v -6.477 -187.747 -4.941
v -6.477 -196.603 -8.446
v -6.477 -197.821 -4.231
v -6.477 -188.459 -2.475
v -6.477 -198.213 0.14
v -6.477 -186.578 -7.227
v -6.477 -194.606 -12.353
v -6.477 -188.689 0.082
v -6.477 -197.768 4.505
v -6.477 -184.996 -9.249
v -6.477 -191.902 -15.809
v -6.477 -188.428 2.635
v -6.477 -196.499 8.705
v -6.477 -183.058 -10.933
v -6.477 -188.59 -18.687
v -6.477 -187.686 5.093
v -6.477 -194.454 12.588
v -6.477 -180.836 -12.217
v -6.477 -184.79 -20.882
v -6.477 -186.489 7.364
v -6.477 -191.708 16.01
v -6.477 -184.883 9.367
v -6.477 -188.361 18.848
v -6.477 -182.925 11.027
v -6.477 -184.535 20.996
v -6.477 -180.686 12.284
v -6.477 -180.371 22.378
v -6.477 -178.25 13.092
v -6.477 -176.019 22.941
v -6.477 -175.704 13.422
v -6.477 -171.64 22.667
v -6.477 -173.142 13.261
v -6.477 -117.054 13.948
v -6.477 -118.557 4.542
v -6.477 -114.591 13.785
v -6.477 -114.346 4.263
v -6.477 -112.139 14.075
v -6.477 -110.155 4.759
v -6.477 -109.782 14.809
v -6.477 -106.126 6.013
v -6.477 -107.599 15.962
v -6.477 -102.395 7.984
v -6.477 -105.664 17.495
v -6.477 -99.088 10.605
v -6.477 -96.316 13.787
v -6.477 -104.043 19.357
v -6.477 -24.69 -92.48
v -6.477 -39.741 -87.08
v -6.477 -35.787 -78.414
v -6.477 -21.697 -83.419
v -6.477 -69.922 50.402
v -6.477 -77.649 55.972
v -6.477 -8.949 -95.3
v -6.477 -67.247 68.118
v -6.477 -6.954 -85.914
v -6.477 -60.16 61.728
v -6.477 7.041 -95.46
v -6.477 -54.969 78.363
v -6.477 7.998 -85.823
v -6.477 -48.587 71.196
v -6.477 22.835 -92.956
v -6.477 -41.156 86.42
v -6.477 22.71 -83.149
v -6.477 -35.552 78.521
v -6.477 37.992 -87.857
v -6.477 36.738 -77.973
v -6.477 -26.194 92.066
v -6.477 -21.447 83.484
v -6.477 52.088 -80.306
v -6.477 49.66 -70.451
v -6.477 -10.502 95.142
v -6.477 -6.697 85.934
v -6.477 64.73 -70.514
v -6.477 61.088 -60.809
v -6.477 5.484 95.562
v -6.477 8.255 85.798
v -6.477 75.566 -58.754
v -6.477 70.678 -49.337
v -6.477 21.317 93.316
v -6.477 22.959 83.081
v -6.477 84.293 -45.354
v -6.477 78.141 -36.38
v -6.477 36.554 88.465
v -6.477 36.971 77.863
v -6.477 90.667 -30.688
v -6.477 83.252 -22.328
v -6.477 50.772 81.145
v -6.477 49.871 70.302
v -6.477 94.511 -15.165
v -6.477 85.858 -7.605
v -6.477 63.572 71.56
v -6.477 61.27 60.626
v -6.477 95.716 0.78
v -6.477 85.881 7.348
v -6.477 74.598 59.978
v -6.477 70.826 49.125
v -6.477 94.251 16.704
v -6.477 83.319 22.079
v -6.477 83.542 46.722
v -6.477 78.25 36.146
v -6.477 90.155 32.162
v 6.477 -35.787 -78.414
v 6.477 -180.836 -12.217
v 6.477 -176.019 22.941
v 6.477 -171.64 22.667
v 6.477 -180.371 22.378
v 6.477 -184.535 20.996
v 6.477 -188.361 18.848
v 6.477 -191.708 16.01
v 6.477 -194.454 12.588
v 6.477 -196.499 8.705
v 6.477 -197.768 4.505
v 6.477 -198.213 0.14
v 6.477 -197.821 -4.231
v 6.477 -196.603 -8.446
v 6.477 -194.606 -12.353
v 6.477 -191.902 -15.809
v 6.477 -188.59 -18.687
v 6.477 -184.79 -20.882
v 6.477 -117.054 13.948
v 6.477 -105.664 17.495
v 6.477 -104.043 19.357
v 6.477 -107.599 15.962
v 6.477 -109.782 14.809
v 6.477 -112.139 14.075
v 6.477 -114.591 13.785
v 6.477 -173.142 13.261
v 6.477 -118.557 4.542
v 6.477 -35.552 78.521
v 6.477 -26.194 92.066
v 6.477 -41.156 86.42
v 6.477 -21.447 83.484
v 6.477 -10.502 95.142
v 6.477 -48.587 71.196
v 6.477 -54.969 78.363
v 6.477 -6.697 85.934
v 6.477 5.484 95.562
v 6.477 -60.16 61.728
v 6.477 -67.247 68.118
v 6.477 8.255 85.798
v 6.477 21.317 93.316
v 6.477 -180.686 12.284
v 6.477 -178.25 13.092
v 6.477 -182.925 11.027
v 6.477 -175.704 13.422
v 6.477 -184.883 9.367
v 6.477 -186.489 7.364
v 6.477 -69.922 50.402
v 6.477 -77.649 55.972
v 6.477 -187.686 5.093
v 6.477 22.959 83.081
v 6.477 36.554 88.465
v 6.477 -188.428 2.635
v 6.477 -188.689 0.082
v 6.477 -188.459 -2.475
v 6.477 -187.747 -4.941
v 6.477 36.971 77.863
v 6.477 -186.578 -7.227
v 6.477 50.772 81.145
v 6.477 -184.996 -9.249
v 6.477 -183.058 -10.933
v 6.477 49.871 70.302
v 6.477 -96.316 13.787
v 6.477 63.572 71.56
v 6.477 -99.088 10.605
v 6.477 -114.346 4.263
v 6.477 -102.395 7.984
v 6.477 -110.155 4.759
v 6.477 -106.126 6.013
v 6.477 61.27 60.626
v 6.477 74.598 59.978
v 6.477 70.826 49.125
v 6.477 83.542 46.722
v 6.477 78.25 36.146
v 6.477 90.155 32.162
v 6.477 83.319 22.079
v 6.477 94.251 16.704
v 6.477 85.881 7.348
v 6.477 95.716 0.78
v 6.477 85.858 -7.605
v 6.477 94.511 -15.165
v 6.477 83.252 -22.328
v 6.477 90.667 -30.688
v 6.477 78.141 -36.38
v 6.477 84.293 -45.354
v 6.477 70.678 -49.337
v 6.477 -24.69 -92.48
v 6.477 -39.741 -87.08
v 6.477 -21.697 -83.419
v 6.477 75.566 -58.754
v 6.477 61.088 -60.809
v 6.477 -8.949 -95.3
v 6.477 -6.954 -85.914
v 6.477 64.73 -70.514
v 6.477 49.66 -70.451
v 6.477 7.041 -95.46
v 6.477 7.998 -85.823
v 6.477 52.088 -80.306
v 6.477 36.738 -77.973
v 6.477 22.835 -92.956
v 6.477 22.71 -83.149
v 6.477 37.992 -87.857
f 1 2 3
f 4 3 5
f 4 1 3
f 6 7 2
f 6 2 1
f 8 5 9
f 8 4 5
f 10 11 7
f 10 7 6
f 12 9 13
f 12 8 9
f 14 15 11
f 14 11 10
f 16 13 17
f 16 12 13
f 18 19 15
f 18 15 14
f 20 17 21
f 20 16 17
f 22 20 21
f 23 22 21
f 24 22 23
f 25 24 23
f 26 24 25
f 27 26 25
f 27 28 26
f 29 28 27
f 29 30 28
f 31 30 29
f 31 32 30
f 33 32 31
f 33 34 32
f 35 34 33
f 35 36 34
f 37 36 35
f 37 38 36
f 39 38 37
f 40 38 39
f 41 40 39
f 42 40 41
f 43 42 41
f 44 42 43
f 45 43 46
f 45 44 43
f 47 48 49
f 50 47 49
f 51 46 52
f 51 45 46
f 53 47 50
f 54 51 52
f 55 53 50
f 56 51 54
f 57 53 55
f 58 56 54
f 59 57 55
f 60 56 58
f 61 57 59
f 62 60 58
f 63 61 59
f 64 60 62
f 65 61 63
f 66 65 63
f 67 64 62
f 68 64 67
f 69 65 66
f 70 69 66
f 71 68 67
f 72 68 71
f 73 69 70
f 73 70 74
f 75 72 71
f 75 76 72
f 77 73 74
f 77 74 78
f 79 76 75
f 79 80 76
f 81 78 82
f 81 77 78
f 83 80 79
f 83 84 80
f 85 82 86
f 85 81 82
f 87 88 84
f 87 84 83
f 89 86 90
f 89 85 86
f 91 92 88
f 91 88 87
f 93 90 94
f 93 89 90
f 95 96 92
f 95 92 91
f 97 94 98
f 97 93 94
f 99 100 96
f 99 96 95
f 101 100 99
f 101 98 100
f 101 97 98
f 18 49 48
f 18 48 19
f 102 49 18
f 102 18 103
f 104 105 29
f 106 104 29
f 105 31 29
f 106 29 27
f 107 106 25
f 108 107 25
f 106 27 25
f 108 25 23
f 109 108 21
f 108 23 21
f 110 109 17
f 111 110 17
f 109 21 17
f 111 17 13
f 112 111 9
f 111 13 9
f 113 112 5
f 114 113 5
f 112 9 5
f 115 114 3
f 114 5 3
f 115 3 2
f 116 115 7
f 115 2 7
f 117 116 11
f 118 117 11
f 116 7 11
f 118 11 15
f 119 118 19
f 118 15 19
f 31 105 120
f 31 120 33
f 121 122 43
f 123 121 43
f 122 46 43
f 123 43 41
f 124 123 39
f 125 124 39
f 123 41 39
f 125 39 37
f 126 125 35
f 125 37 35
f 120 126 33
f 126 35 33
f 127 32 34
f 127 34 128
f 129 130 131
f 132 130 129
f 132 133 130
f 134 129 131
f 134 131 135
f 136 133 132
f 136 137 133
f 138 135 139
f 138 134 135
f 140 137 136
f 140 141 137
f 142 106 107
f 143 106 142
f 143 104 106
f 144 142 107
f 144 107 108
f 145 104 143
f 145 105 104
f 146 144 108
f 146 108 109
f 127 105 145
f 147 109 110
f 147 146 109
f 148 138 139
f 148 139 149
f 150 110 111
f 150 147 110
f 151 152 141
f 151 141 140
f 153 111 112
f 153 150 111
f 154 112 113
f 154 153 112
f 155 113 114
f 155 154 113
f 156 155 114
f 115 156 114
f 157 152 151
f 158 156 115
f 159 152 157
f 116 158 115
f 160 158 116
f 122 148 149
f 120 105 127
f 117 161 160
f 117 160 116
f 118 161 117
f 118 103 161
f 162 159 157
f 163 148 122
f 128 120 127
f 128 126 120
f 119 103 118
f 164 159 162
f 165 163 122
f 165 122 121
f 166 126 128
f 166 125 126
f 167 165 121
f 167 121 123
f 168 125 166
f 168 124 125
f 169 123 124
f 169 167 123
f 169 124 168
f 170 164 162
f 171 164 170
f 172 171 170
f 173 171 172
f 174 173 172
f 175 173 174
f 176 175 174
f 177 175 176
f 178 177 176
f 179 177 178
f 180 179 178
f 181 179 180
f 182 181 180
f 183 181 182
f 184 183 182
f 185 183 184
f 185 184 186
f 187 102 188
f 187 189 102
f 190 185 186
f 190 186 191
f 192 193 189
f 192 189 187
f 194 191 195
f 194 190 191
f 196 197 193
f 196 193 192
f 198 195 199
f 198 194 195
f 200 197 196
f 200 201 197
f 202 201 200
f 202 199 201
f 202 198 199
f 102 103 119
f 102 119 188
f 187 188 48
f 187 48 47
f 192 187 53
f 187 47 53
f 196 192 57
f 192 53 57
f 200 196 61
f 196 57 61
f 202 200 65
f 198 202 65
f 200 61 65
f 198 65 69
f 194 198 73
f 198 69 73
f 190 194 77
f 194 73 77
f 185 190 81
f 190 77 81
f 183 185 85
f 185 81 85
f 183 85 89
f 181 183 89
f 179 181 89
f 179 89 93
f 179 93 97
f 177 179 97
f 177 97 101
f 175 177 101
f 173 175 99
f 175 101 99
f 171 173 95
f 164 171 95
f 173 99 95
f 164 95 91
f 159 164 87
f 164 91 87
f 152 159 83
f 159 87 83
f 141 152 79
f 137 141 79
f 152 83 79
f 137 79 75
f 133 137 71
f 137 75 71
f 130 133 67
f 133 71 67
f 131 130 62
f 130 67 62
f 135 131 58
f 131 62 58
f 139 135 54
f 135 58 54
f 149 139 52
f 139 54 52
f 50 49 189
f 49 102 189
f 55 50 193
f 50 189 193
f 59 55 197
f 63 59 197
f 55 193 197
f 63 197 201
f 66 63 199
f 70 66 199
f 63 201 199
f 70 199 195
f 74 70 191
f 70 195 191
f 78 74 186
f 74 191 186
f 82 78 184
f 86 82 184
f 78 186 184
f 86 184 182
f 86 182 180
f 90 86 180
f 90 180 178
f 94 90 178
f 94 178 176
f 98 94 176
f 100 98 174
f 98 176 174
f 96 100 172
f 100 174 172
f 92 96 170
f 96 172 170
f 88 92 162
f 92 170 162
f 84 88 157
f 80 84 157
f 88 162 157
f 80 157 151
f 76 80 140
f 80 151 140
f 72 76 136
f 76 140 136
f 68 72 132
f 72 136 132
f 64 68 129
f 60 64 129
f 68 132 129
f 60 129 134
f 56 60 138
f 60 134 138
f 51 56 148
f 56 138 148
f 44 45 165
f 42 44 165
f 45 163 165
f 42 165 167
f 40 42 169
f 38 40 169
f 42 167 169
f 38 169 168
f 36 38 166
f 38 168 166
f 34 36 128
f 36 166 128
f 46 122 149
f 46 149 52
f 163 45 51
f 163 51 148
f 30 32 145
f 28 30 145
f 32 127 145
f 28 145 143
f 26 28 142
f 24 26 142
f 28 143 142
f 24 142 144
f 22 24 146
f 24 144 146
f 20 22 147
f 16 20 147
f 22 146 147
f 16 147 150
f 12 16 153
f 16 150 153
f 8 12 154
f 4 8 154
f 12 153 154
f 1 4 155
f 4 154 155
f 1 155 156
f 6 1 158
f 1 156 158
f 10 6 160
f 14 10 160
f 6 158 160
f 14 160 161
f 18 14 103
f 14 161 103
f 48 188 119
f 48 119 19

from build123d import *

# Parameters (mm, degrees)
SKETCH2_W = 12.954
SKETCH2_H = 9.525


with BuildPart() as part:
    # Sweep1: sweep along a path in Sketch1
    with BuildLine(Plane(origin=(0, 0, 0), x_dir=(0, 0, -1), z_dir=(1, 0, 0))) as sweep1_path:
        Line((16.54938381, -182.81283345), (82.746919051, -37.764167251))
        ThreePointArc((82.746919051, -37.764167251), (-23.298735464, 87.922430962), (-53.187131299, -73.785594832))
        Line((-53.187131299, -73.785594832), (-16.57165453, -100.179258458))
        ThreePointArc((-16.57165453, -100.179258458), (-10.410929492, -107.954292451), (-9.245359354, -117.80554277))
        Line((-9.245359354, -117.80554277), (-17.963721436, -172.390834655))
        ThreePointArc((-17.963721436, -172.390834655), (-5.258764347, -192.674729259), (16.54938381, -182.81283345))
    # Sketch2 → Sweep1 (sweep)
    with BuildSketch(Plane.XY):
        with Locations((0, 90.957049977)):
            Rectangle(SKETCH2_W, SKETCH2_H)
    sweep(path=sweep1_path.line)


solid = part.part
